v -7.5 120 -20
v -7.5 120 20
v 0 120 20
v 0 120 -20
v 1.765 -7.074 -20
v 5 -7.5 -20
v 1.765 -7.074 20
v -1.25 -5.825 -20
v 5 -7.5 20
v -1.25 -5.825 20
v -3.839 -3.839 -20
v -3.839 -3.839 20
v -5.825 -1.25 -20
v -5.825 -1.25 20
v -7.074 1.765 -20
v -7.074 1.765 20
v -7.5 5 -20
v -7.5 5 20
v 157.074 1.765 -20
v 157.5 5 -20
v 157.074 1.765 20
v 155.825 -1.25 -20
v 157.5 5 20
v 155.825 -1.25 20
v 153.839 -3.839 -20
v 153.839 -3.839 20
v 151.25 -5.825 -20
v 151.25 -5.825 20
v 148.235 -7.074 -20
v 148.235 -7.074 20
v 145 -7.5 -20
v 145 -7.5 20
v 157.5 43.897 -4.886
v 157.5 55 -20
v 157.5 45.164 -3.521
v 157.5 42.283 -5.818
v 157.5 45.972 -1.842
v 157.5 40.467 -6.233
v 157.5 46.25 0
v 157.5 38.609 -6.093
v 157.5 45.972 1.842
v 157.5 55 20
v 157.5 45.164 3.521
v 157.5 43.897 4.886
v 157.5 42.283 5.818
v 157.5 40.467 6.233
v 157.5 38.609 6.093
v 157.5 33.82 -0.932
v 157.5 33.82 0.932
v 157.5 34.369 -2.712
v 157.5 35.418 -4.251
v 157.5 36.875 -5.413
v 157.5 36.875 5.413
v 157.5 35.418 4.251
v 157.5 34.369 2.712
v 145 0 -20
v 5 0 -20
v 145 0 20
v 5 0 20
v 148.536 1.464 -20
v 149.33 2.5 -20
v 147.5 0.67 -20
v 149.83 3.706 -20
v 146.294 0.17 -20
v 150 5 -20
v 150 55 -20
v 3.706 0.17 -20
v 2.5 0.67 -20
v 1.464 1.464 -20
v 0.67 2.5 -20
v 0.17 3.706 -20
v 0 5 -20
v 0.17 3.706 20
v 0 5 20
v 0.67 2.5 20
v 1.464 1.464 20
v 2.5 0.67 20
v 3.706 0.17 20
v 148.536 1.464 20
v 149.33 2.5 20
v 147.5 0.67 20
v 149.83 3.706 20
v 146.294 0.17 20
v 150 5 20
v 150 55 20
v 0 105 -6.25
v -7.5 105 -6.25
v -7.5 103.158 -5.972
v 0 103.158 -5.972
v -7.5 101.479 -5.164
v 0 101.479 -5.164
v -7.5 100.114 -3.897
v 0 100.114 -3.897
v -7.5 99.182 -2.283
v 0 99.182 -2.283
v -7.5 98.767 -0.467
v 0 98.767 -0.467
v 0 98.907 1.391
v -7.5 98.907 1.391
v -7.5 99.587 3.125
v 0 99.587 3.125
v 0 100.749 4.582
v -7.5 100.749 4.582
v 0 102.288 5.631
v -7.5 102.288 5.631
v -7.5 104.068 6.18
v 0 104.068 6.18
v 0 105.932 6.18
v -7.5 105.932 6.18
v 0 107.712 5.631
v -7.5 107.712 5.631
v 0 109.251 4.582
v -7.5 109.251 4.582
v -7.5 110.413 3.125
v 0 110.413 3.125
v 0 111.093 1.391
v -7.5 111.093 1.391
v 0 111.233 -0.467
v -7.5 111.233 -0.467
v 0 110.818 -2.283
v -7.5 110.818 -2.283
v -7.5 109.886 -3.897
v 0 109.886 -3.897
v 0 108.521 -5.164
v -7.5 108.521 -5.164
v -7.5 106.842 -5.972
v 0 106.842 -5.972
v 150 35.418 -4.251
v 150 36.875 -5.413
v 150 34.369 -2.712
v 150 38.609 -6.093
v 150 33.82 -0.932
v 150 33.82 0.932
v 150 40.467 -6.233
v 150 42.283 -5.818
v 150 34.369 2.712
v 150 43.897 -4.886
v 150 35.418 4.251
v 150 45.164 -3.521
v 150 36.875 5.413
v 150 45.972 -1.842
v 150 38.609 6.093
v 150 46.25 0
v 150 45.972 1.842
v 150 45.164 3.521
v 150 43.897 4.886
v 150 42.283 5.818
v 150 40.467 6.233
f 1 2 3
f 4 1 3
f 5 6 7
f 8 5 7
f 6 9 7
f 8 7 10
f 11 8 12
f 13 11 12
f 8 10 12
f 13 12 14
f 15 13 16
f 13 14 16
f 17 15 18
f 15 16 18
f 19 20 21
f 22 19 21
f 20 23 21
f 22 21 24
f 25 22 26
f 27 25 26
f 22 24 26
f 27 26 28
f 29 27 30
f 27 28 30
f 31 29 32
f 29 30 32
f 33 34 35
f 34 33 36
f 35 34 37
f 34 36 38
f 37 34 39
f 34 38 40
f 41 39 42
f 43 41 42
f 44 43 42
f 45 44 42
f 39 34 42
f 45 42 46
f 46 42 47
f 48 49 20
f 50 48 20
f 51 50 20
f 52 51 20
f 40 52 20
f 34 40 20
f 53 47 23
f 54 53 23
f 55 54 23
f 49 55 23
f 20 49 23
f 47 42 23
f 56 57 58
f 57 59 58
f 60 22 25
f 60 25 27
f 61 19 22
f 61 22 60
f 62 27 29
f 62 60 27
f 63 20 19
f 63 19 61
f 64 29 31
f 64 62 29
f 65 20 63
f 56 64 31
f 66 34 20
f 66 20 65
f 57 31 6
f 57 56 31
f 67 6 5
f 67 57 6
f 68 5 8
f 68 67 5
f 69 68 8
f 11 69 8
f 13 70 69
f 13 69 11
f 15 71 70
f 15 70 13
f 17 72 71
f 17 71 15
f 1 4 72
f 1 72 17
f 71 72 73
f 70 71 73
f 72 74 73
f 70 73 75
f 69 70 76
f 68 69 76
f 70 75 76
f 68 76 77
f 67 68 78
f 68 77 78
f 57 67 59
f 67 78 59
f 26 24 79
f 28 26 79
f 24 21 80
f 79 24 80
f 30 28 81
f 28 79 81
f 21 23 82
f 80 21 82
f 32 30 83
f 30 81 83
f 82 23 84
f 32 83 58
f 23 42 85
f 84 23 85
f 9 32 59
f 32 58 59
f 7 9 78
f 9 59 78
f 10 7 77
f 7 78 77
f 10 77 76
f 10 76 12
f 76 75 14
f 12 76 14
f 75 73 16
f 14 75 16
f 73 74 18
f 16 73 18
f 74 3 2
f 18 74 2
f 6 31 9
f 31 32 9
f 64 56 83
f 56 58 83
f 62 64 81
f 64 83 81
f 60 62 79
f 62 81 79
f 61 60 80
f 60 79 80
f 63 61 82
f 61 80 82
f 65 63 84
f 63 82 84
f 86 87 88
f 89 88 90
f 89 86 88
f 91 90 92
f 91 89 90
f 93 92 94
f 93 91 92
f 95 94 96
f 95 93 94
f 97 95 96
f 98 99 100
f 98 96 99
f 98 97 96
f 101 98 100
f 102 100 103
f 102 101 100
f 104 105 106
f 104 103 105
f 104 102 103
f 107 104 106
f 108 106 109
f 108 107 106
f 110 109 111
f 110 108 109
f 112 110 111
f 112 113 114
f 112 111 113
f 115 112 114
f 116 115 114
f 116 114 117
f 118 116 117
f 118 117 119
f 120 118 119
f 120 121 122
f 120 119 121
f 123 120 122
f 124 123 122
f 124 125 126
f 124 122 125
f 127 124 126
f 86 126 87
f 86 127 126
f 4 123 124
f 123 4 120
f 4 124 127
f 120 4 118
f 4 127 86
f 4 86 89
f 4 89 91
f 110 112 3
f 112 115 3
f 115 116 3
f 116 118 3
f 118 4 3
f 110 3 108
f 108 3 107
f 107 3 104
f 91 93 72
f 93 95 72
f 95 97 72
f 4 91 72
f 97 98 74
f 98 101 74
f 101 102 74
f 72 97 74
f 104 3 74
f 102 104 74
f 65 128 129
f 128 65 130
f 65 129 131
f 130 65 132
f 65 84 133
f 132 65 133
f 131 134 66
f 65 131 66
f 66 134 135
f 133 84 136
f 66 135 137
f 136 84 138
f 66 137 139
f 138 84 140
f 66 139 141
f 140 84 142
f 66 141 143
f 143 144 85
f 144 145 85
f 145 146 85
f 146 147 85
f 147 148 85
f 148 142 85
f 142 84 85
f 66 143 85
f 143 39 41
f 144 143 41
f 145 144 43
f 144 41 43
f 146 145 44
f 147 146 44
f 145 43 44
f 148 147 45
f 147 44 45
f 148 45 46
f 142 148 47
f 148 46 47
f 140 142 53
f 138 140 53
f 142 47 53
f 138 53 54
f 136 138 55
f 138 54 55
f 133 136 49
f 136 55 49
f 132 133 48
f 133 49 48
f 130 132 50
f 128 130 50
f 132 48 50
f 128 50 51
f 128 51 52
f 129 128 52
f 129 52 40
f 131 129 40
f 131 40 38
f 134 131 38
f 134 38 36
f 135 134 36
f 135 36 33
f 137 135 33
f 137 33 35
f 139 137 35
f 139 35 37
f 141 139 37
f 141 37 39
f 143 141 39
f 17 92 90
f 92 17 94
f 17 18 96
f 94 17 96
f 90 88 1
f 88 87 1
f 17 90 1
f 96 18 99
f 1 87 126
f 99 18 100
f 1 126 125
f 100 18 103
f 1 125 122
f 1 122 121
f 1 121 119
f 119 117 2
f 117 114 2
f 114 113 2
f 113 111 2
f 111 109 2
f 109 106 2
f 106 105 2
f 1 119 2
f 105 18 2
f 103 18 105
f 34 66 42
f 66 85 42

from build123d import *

# Parameters (mm, degrees)
BASE_EXTRUDE_THIN_DEPTH = 20
CUT_EXTRUDE1_REACH      = 187.74
SKETCH2_R               = 6.25
CUT_EXTRUDE2_REACH      = 207
SKETCH3_R               = 6.25


with BuildPart() as part:
    # Sketch1 → Base-Extrude-Thin (new, symmetric)
    with BuildSketch(Plane.XY):
        with BuildLine():
            Line((0, 120), (0, 5))
            ThreePointArc((0, 5), (1.464466094, 1.464466094), (5, 0))
            Line((5, 0), (145, 0))
            ThreePointArc((145, 0), (148.535533906, 1.464466094), (150, 5))
            Line((150, 5), (150, 55))
            Line((150, 55), (157.5, 55))
            Line((157.5, 55), (157.5, 5))
            ThreePointArc((157.5, 5), (153.838834765, -3.838834765), (145, -7.5))
            Line((145, -7.5), (5, -7.5))
            ThreePointArc((5, -7.5), (-3.838834765, -3.838834765), (-7.5, 5))
            Line((-7.5, 5), (-7.5, 120))
            Line((-7.5, 120), (0, 120))
        make_face()
    extrude(amount=BASE_EXTRUDE_THIN_DEPTH, both=True)

    # Sketch2 → Cut-Extrude1 (cut, up to next)
    with BuildSketch(Plane(origin=(0, 88.9, 0), x_dir=(0, -1, 0), z_dir=(-1, 0, 0)), mode=Mode.PRIVATE) as cut_extrude1_sk1:
        with Locations(Location((-16.1, 0, 0), (0, 0, 270))):
            Circle(SKETCH2_R)
    cut_extrude1_tool1 = extrude(cut_extrude1_sk1.sketch, amount=CUT_EXTRUDE1_REACH, mode=Mode.PRIVATE) & part.part
    add(cut_extrude1_tool1.solids().sort_by_distance((0, 105, 0))[0], mode=Mode.SUBTRACT)

    # Sketch3 → Cut-Extrude2 (cut, up to next)
    with BuildSketch(Plane(origin=(157.5, 0, 0), x_dir=(0, 0, -1), z_dir=(1, 0, 0)), mode=Mode.PRIVATE) as cut_extrude2_sk1:
        with Locations(Location((0, 40, 0), (0, 0, 90))):
            Circle(SKETCH3_R)
    cut_extrude2_tool1 = extrude(cut_extrude2_sk1.sketch, amount=-CUT_EXTRUDE2_REACH, mode=Mode.PRIVATE) & part.part
    add(cut_extrude2_tool1.solids().sort_by_distance((157.5, 40, 0))[0], mode=Mode.SUBTRACT)


solid = part.part
